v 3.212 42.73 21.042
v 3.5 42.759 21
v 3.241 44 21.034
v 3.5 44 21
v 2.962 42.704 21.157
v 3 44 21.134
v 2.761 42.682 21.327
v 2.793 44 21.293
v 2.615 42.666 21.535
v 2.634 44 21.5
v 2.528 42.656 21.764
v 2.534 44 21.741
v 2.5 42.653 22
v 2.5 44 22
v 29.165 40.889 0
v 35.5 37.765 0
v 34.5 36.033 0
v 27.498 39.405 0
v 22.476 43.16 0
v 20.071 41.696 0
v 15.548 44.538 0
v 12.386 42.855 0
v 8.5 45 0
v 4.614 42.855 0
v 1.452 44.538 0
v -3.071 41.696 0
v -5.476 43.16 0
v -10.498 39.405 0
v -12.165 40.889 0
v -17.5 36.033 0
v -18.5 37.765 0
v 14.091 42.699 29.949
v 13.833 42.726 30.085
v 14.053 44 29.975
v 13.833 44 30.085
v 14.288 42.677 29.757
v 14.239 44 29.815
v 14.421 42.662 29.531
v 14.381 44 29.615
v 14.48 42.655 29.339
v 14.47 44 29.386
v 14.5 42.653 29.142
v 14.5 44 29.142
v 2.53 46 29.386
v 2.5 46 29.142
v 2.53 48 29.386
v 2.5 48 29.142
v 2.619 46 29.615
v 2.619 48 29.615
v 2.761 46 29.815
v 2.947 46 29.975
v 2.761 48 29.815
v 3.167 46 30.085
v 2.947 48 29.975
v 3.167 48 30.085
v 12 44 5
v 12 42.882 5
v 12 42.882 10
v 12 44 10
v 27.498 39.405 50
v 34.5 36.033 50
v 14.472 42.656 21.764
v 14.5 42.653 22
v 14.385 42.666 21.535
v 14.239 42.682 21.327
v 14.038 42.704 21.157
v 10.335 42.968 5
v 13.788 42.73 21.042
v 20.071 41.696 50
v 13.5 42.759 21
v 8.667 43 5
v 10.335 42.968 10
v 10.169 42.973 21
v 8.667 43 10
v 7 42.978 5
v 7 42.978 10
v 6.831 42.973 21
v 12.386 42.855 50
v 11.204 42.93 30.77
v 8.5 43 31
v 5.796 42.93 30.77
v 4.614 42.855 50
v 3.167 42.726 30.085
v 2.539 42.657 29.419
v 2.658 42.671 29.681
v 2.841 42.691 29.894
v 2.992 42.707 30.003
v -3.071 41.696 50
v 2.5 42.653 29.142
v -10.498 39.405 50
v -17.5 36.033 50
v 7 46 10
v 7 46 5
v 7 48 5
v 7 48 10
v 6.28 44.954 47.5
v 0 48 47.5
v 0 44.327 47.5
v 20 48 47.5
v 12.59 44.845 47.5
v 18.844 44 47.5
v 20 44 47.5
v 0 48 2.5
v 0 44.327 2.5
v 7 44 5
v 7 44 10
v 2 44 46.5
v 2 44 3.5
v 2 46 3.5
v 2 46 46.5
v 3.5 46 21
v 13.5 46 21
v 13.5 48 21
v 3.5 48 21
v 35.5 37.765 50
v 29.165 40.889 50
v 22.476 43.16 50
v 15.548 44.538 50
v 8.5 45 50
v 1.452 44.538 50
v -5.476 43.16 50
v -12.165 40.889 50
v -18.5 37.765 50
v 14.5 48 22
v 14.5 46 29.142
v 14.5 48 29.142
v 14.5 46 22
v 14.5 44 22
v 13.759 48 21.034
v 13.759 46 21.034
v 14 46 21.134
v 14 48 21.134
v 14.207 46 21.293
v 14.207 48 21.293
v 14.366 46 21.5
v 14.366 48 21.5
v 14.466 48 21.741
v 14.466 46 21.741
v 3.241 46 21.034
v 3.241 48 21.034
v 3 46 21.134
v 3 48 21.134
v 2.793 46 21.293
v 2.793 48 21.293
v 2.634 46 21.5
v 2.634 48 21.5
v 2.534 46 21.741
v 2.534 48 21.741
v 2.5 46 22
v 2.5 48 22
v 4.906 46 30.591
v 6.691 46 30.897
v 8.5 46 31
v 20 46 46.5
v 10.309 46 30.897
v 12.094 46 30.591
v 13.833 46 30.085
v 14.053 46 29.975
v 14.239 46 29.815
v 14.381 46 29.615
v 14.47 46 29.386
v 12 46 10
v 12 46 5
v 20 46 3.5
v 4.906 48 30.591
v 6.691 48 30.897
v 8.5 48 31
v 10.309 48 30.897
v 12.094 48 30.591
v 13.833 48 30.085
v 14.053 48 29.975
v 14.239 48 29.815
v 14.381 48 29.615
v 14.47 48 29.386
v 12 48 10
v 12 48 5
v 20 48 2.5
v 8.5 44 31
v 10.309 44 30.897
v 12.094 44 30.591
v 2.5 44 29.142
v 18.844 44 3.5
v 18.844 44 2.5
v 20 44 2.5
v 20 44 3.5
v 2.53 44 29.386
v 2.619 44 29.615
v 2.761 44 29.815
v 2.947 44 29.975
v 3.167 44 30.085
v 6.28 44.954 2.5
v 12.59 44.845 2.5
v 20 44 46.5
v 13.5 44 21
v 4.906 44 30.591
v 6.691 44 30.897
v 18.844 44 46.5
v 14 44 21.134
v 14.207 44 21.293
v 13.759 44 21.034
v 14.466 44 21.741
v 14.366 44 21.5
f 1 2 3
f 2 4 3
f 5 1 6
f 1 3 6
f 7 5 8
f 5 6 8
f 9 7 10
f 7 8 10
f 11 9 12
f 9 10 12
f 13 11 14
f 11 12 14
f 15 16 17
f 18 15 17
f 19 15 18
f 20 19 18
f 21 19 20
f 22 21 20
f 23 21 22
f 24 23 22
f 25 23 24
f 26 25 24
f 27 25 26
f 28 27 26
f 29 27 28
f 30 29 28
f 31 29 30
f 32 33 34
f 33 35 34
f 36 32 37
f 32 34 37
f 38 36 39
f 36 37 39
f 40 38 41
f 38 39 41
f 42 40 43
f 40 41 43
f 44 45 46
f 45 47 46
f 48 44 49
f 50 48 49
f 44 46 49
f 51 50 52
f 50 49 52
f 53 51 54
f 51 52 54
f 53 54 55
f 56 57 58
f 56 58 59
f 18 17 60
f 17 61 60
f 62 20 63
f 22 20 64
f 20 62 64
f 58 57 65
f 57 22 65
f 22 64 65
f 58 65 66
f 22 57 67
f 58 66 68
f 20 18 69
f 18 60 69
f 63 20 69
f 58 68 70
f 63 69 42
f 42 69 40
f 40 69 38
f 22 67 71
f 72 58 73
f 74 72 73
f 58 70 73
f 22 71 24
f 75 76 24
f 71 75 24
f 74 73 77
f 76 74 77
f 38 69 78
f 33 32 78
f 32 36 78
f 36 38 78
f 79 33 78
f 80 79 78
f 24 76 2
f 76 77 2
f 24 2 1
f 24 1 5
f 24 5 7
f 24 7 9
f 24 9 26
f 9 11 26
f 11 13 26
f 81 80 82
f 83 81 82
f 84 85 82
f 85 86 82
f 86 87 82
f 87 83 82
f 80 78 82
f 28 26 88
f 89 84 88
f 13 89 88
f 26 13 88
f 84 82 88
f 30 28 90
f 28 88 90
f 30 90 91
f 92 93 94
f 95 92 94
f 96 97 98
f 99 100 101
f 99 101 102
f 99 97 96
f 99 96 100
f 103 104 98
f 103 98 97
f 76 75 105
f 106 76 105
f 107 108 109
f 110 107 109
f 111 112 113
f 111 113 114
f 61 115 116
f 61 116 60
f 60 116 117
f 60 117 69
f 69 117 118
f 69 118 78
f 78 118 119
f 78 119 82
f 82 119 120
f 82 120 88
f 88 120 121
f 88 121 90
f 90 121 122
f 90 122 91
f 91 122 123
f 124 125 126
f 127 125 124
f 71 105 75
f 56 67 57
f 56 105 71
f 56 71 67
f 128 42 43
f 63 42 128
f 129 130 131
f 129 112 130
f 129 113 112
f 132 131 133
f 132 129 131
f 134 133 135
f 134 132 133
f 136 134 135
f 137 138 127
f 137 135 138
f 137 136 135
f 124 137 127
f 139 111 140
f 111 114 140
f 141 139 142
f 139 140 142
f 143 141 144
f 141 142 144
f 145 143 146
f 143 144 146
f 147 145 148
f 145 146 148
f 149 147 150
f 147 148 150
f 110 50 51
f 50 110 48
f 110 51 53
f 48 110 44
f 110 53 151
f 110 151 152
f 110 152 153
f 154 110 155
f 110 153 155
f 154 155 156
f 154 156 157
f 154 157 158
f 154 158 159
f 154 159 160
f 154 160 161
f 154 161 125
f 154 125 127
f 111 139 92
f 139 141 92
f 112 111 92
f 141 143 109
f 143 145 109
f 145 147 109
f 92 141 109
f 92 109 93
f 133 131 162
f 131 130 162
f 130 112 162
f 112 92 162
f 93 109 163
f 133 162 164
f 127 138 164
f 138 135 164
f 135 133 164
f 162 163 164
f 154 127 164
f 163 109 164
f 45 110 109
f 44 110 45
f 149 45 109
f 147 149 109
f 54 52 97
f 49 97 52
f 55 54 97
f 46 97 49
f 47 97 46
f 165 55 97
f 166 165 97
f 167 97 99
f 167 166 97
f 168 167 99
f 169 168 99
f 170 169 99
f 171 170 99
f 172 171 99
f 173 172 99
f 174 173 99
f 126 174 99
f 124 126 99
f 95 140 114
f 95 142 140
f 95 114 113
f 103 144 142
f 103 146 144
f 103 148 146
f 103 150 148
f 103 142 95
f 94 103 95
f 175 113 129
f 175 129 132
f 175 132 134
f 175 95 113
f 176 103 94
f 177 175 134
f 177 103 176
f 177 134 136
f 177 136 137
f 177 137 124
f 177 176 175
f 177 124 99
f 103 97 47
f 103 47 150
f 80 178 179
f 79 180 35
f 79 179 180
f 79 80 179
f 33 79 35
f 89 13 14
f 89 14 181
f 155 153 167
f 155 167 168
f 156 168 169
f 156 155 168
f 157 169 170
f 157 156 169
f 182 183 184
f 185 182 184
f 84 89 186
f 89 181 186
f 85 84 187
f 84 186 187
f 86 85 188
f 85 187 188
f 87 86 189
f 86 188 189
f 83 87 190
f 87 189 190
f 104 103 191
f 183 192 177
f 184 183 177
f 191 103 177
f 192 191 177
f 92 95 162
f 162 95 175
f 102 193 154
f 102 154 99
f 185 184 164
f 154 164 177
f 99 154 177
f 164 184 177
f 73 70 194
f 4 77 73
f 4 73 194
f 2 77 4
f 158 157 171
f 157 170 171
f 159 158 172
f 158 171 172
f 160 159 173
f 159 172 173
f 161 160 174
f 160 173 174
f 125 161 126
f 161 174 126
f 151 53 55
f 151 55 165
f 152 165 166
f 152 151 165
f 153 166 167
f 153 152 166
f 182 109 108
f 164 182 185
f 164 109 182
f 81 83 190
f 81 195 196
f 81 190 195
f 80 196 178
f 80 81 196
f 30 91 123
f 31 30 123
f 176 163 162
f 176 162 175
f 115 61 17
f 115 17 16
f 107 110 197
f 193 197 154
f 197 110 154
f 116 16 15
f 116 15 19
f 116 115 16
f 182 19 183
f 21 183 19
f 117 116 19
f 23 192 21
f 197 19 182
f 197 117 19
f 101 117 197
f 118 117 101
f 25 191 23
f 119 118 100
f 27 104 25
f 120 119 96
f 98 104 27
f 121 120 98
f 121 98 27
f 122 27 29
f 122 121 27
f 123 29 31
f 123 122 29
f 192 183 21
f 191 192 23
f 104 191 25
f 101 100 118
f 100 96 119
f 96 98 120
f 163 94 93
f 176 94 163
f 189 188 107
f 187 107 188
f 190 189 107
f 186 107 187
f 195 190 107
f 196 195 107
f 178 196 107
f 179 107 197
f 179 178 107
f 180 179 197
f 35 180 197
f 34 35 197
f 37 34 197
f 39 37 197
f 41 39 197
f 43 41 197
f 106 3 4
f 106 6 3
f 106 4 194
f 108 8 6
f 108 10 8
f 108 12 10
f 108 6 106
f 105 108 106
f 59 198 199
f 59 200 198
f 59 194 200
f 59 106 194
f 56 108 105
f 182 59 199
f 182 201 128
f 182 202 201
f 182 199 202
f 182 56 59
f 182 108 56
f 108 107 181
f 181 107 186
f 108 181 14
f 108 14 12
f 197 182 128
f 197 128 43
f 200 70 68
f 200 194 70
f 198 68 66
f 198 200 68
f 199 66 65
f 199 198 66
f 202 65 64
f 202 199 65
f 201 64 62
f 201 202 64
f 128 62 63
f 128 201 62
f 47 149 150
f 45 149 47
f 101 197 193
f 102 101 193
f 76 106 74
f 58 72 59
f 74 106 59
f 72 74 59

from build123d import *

# Parameters (mm, degrees)
EXTRUDE_DEPTH               = 6
EXTRUDE001_DEPTH            = 6
THICKNESS_T                 = 1
BOX002_W                    = 20
BOX002_H                    = 2
BOX002_DEPTH                = 43
BOX_W                       = 5
BOX_H                       = 20
BOX_DEPTH                   = 5
BOX001_W                    = 20
BOX001_H                    = 4
BOX001_DEPTH                = 45
CYLINDER001_W               = 52
CYLINDER001_H               = 50
CYLINDER001_ANGLE           = 60
CYLINDER001_PLACEMENT_ANGLE = 60
CYLINDER_W                  = 54
CYLINDER_H                  = 50
CYLINDER_ANGLE              = 60
CYLINDER_PLACEMENT_ANGLE    = 60


with BuildPart() as extrude_body:
    # Common_cs001 → Extrude (new body)
    with BuildSketch(Plane(origin=(8.5, 45, 6), x_dir=(1, 0, 0), z_dir=(0, 1, 0))):
        with BuildLine():
            Line((5, 4), (-5, 4))
            Line((-5, 4), (-5, -3.142136))
            ThreePointArc((-5, -3.142136), (-2.53653, -3.783978), (0, -4))
            ThreePointArc((0, -4), (2.53653, -3.783978), (5, -3.142136))
            Line((5, -3.142136), (5, 4))
        make_face()
    extrude(amount=EXTRUDE_DEPTH)


with BuildPart() as extrude001:
    # Common_cs002 → Extrude001 (new body)
    with BuildSketch(Plane(origin=(8.5, 45, 6), x_dir=(1, 0, 0), z_dir=(0, 1, 0))):
        with BuildLine():
            Line((5, 4), (-5, 4))
            Line((-5, 4), (-5, -3.142136))
            ThreePointArc((-5, -3.142136), (-2.53653, -3.783978), (0, -4))
            ThreePointArc((0, -4), (2.53653, -3.783978), (5, -3.142136))
            Line((5, -3.142136), (5, 4))
        make_face()
    extrude(amount=EXTRUDE001_DEPTH)


with BuildPart() as fusion002:
    # Thickness base: copy of Extrude body
    add(extrude_body.part)

    # Thickness
    thickness_openings = [fusion002.faces().sort_by_distance(p)[0] for p in [
        (8.5, 51, 5.862901),
    ]]
    offset(amount=THICKNESS_T, openings=thickness_openings)

    # Fusion002: union Extrude body, Extrude001
    add(extrude_body.part)
    add(extrude001.part)


with BuildPart() as fusion002_1:
    # Fusion002 placement: moved
    add(fusion002.part.moved(Location((0, -3, 20))))


with BuildPart() as slot:
    # Box002 → Box002 (new body)
    with BuildSketch(Plane(origin=(2, 44, 3.5), x_dir=(1, 0, 0), z_dir=(0, 0, 1))):
        with Locations((10, 1)):
            Rectangle(BOX002_W, BOX002_H)
    extrude(amount=BOX002_DEPTH)


with BuildPart() as pin_opening:
    # Box → Box (new body)
    with BuildSketch(Plane(origin=(7, 42, 5), x_dir=(1, 0, 0), z_dir=(0, 0, 1))):
        with Locations((2.5, 10)):
            Rectangle(BOX_W, BOX_H)
    extrude(amount=BOX_DEPTH)


with BuildPart() as latch:
    # Box001 → Box001 (new body)
    with BuildSketch(Plane(origin=(0, 44, 2.5), x_dir=(1, 0, 0), z_dir=(0, 0, 1))):
        with Locations((10, 2)):
            Rectangle(BOX001_W, BOX001_H)
    extrude(amount=BOX001_DEPTH)


with BuildPart() as bottle_wall001:
    # Cylinder001 → Cylinder001 (revolve)
    with BuildSketch(Plane.XZ):
        with Locations((26, 25)):
            Rectangle(CYLINDER001_W, CYLINDER001_H)
    revolve(axis=Axis((0, 0, 0), (0, 0, 1)), revolution_arc=CYLINDER001_ANGLE)


with BuildPart() as bottle_wall001_1:
    # Cylinder001 placement: moved
    add(bottle_wall001.part.moved(Location((8.5, -7, 0))).rotate(Axis((8.5, -7, 0), (0, 0, 1)), CYLINDER001_PLACEMENT_ANGLE))


with BuildPart() as cut003:
    # Cylinder → Cylinder (revolve)
    with BuildSketch(Plane.XZ):
        with Locations((27, 25)):
            Rectangle(CYLINDER_W, CYLINDER_H)
    revolve(axis=Axis((0, 0, 0), (0, 0, 1)), revolution_arc=CYLINDER_ANGLE)


with BuildPart() as cut003_1:
    # Cylinder placement: moved
    add(cut003.part.moved(Location((8.5, -7, 0))).rotate(Axis((8.5, -7, 0), (0, 0, 1)), CYLINDER_PLACEMENT_ANGLE))

    # Cut: cut bottle_wall001
    add(bottle_wall001_1.part, mode=Mode.SUBTRACT)


with BuildPart() as cut003_2:
    # Cut placement: moved
    add(cut003_1.part.moved(Location((0, -2, 0))))

    # Fusion: union latch
    add(latch.part)

    # Fusion001: union latch
    add(latch.part)

    # Cut001: cut pin_opening
    add(pin_opening.part, mode=Mode.SUBTRACT)

    # Cut002: cut slot
    add(slot.part, mode=Mode.SUBTRACT)

    # Cut003: cut Fusion002
    add(fusion002_1.part, mode=Mode.SUBTRACT)


solid = cut003_2.part
